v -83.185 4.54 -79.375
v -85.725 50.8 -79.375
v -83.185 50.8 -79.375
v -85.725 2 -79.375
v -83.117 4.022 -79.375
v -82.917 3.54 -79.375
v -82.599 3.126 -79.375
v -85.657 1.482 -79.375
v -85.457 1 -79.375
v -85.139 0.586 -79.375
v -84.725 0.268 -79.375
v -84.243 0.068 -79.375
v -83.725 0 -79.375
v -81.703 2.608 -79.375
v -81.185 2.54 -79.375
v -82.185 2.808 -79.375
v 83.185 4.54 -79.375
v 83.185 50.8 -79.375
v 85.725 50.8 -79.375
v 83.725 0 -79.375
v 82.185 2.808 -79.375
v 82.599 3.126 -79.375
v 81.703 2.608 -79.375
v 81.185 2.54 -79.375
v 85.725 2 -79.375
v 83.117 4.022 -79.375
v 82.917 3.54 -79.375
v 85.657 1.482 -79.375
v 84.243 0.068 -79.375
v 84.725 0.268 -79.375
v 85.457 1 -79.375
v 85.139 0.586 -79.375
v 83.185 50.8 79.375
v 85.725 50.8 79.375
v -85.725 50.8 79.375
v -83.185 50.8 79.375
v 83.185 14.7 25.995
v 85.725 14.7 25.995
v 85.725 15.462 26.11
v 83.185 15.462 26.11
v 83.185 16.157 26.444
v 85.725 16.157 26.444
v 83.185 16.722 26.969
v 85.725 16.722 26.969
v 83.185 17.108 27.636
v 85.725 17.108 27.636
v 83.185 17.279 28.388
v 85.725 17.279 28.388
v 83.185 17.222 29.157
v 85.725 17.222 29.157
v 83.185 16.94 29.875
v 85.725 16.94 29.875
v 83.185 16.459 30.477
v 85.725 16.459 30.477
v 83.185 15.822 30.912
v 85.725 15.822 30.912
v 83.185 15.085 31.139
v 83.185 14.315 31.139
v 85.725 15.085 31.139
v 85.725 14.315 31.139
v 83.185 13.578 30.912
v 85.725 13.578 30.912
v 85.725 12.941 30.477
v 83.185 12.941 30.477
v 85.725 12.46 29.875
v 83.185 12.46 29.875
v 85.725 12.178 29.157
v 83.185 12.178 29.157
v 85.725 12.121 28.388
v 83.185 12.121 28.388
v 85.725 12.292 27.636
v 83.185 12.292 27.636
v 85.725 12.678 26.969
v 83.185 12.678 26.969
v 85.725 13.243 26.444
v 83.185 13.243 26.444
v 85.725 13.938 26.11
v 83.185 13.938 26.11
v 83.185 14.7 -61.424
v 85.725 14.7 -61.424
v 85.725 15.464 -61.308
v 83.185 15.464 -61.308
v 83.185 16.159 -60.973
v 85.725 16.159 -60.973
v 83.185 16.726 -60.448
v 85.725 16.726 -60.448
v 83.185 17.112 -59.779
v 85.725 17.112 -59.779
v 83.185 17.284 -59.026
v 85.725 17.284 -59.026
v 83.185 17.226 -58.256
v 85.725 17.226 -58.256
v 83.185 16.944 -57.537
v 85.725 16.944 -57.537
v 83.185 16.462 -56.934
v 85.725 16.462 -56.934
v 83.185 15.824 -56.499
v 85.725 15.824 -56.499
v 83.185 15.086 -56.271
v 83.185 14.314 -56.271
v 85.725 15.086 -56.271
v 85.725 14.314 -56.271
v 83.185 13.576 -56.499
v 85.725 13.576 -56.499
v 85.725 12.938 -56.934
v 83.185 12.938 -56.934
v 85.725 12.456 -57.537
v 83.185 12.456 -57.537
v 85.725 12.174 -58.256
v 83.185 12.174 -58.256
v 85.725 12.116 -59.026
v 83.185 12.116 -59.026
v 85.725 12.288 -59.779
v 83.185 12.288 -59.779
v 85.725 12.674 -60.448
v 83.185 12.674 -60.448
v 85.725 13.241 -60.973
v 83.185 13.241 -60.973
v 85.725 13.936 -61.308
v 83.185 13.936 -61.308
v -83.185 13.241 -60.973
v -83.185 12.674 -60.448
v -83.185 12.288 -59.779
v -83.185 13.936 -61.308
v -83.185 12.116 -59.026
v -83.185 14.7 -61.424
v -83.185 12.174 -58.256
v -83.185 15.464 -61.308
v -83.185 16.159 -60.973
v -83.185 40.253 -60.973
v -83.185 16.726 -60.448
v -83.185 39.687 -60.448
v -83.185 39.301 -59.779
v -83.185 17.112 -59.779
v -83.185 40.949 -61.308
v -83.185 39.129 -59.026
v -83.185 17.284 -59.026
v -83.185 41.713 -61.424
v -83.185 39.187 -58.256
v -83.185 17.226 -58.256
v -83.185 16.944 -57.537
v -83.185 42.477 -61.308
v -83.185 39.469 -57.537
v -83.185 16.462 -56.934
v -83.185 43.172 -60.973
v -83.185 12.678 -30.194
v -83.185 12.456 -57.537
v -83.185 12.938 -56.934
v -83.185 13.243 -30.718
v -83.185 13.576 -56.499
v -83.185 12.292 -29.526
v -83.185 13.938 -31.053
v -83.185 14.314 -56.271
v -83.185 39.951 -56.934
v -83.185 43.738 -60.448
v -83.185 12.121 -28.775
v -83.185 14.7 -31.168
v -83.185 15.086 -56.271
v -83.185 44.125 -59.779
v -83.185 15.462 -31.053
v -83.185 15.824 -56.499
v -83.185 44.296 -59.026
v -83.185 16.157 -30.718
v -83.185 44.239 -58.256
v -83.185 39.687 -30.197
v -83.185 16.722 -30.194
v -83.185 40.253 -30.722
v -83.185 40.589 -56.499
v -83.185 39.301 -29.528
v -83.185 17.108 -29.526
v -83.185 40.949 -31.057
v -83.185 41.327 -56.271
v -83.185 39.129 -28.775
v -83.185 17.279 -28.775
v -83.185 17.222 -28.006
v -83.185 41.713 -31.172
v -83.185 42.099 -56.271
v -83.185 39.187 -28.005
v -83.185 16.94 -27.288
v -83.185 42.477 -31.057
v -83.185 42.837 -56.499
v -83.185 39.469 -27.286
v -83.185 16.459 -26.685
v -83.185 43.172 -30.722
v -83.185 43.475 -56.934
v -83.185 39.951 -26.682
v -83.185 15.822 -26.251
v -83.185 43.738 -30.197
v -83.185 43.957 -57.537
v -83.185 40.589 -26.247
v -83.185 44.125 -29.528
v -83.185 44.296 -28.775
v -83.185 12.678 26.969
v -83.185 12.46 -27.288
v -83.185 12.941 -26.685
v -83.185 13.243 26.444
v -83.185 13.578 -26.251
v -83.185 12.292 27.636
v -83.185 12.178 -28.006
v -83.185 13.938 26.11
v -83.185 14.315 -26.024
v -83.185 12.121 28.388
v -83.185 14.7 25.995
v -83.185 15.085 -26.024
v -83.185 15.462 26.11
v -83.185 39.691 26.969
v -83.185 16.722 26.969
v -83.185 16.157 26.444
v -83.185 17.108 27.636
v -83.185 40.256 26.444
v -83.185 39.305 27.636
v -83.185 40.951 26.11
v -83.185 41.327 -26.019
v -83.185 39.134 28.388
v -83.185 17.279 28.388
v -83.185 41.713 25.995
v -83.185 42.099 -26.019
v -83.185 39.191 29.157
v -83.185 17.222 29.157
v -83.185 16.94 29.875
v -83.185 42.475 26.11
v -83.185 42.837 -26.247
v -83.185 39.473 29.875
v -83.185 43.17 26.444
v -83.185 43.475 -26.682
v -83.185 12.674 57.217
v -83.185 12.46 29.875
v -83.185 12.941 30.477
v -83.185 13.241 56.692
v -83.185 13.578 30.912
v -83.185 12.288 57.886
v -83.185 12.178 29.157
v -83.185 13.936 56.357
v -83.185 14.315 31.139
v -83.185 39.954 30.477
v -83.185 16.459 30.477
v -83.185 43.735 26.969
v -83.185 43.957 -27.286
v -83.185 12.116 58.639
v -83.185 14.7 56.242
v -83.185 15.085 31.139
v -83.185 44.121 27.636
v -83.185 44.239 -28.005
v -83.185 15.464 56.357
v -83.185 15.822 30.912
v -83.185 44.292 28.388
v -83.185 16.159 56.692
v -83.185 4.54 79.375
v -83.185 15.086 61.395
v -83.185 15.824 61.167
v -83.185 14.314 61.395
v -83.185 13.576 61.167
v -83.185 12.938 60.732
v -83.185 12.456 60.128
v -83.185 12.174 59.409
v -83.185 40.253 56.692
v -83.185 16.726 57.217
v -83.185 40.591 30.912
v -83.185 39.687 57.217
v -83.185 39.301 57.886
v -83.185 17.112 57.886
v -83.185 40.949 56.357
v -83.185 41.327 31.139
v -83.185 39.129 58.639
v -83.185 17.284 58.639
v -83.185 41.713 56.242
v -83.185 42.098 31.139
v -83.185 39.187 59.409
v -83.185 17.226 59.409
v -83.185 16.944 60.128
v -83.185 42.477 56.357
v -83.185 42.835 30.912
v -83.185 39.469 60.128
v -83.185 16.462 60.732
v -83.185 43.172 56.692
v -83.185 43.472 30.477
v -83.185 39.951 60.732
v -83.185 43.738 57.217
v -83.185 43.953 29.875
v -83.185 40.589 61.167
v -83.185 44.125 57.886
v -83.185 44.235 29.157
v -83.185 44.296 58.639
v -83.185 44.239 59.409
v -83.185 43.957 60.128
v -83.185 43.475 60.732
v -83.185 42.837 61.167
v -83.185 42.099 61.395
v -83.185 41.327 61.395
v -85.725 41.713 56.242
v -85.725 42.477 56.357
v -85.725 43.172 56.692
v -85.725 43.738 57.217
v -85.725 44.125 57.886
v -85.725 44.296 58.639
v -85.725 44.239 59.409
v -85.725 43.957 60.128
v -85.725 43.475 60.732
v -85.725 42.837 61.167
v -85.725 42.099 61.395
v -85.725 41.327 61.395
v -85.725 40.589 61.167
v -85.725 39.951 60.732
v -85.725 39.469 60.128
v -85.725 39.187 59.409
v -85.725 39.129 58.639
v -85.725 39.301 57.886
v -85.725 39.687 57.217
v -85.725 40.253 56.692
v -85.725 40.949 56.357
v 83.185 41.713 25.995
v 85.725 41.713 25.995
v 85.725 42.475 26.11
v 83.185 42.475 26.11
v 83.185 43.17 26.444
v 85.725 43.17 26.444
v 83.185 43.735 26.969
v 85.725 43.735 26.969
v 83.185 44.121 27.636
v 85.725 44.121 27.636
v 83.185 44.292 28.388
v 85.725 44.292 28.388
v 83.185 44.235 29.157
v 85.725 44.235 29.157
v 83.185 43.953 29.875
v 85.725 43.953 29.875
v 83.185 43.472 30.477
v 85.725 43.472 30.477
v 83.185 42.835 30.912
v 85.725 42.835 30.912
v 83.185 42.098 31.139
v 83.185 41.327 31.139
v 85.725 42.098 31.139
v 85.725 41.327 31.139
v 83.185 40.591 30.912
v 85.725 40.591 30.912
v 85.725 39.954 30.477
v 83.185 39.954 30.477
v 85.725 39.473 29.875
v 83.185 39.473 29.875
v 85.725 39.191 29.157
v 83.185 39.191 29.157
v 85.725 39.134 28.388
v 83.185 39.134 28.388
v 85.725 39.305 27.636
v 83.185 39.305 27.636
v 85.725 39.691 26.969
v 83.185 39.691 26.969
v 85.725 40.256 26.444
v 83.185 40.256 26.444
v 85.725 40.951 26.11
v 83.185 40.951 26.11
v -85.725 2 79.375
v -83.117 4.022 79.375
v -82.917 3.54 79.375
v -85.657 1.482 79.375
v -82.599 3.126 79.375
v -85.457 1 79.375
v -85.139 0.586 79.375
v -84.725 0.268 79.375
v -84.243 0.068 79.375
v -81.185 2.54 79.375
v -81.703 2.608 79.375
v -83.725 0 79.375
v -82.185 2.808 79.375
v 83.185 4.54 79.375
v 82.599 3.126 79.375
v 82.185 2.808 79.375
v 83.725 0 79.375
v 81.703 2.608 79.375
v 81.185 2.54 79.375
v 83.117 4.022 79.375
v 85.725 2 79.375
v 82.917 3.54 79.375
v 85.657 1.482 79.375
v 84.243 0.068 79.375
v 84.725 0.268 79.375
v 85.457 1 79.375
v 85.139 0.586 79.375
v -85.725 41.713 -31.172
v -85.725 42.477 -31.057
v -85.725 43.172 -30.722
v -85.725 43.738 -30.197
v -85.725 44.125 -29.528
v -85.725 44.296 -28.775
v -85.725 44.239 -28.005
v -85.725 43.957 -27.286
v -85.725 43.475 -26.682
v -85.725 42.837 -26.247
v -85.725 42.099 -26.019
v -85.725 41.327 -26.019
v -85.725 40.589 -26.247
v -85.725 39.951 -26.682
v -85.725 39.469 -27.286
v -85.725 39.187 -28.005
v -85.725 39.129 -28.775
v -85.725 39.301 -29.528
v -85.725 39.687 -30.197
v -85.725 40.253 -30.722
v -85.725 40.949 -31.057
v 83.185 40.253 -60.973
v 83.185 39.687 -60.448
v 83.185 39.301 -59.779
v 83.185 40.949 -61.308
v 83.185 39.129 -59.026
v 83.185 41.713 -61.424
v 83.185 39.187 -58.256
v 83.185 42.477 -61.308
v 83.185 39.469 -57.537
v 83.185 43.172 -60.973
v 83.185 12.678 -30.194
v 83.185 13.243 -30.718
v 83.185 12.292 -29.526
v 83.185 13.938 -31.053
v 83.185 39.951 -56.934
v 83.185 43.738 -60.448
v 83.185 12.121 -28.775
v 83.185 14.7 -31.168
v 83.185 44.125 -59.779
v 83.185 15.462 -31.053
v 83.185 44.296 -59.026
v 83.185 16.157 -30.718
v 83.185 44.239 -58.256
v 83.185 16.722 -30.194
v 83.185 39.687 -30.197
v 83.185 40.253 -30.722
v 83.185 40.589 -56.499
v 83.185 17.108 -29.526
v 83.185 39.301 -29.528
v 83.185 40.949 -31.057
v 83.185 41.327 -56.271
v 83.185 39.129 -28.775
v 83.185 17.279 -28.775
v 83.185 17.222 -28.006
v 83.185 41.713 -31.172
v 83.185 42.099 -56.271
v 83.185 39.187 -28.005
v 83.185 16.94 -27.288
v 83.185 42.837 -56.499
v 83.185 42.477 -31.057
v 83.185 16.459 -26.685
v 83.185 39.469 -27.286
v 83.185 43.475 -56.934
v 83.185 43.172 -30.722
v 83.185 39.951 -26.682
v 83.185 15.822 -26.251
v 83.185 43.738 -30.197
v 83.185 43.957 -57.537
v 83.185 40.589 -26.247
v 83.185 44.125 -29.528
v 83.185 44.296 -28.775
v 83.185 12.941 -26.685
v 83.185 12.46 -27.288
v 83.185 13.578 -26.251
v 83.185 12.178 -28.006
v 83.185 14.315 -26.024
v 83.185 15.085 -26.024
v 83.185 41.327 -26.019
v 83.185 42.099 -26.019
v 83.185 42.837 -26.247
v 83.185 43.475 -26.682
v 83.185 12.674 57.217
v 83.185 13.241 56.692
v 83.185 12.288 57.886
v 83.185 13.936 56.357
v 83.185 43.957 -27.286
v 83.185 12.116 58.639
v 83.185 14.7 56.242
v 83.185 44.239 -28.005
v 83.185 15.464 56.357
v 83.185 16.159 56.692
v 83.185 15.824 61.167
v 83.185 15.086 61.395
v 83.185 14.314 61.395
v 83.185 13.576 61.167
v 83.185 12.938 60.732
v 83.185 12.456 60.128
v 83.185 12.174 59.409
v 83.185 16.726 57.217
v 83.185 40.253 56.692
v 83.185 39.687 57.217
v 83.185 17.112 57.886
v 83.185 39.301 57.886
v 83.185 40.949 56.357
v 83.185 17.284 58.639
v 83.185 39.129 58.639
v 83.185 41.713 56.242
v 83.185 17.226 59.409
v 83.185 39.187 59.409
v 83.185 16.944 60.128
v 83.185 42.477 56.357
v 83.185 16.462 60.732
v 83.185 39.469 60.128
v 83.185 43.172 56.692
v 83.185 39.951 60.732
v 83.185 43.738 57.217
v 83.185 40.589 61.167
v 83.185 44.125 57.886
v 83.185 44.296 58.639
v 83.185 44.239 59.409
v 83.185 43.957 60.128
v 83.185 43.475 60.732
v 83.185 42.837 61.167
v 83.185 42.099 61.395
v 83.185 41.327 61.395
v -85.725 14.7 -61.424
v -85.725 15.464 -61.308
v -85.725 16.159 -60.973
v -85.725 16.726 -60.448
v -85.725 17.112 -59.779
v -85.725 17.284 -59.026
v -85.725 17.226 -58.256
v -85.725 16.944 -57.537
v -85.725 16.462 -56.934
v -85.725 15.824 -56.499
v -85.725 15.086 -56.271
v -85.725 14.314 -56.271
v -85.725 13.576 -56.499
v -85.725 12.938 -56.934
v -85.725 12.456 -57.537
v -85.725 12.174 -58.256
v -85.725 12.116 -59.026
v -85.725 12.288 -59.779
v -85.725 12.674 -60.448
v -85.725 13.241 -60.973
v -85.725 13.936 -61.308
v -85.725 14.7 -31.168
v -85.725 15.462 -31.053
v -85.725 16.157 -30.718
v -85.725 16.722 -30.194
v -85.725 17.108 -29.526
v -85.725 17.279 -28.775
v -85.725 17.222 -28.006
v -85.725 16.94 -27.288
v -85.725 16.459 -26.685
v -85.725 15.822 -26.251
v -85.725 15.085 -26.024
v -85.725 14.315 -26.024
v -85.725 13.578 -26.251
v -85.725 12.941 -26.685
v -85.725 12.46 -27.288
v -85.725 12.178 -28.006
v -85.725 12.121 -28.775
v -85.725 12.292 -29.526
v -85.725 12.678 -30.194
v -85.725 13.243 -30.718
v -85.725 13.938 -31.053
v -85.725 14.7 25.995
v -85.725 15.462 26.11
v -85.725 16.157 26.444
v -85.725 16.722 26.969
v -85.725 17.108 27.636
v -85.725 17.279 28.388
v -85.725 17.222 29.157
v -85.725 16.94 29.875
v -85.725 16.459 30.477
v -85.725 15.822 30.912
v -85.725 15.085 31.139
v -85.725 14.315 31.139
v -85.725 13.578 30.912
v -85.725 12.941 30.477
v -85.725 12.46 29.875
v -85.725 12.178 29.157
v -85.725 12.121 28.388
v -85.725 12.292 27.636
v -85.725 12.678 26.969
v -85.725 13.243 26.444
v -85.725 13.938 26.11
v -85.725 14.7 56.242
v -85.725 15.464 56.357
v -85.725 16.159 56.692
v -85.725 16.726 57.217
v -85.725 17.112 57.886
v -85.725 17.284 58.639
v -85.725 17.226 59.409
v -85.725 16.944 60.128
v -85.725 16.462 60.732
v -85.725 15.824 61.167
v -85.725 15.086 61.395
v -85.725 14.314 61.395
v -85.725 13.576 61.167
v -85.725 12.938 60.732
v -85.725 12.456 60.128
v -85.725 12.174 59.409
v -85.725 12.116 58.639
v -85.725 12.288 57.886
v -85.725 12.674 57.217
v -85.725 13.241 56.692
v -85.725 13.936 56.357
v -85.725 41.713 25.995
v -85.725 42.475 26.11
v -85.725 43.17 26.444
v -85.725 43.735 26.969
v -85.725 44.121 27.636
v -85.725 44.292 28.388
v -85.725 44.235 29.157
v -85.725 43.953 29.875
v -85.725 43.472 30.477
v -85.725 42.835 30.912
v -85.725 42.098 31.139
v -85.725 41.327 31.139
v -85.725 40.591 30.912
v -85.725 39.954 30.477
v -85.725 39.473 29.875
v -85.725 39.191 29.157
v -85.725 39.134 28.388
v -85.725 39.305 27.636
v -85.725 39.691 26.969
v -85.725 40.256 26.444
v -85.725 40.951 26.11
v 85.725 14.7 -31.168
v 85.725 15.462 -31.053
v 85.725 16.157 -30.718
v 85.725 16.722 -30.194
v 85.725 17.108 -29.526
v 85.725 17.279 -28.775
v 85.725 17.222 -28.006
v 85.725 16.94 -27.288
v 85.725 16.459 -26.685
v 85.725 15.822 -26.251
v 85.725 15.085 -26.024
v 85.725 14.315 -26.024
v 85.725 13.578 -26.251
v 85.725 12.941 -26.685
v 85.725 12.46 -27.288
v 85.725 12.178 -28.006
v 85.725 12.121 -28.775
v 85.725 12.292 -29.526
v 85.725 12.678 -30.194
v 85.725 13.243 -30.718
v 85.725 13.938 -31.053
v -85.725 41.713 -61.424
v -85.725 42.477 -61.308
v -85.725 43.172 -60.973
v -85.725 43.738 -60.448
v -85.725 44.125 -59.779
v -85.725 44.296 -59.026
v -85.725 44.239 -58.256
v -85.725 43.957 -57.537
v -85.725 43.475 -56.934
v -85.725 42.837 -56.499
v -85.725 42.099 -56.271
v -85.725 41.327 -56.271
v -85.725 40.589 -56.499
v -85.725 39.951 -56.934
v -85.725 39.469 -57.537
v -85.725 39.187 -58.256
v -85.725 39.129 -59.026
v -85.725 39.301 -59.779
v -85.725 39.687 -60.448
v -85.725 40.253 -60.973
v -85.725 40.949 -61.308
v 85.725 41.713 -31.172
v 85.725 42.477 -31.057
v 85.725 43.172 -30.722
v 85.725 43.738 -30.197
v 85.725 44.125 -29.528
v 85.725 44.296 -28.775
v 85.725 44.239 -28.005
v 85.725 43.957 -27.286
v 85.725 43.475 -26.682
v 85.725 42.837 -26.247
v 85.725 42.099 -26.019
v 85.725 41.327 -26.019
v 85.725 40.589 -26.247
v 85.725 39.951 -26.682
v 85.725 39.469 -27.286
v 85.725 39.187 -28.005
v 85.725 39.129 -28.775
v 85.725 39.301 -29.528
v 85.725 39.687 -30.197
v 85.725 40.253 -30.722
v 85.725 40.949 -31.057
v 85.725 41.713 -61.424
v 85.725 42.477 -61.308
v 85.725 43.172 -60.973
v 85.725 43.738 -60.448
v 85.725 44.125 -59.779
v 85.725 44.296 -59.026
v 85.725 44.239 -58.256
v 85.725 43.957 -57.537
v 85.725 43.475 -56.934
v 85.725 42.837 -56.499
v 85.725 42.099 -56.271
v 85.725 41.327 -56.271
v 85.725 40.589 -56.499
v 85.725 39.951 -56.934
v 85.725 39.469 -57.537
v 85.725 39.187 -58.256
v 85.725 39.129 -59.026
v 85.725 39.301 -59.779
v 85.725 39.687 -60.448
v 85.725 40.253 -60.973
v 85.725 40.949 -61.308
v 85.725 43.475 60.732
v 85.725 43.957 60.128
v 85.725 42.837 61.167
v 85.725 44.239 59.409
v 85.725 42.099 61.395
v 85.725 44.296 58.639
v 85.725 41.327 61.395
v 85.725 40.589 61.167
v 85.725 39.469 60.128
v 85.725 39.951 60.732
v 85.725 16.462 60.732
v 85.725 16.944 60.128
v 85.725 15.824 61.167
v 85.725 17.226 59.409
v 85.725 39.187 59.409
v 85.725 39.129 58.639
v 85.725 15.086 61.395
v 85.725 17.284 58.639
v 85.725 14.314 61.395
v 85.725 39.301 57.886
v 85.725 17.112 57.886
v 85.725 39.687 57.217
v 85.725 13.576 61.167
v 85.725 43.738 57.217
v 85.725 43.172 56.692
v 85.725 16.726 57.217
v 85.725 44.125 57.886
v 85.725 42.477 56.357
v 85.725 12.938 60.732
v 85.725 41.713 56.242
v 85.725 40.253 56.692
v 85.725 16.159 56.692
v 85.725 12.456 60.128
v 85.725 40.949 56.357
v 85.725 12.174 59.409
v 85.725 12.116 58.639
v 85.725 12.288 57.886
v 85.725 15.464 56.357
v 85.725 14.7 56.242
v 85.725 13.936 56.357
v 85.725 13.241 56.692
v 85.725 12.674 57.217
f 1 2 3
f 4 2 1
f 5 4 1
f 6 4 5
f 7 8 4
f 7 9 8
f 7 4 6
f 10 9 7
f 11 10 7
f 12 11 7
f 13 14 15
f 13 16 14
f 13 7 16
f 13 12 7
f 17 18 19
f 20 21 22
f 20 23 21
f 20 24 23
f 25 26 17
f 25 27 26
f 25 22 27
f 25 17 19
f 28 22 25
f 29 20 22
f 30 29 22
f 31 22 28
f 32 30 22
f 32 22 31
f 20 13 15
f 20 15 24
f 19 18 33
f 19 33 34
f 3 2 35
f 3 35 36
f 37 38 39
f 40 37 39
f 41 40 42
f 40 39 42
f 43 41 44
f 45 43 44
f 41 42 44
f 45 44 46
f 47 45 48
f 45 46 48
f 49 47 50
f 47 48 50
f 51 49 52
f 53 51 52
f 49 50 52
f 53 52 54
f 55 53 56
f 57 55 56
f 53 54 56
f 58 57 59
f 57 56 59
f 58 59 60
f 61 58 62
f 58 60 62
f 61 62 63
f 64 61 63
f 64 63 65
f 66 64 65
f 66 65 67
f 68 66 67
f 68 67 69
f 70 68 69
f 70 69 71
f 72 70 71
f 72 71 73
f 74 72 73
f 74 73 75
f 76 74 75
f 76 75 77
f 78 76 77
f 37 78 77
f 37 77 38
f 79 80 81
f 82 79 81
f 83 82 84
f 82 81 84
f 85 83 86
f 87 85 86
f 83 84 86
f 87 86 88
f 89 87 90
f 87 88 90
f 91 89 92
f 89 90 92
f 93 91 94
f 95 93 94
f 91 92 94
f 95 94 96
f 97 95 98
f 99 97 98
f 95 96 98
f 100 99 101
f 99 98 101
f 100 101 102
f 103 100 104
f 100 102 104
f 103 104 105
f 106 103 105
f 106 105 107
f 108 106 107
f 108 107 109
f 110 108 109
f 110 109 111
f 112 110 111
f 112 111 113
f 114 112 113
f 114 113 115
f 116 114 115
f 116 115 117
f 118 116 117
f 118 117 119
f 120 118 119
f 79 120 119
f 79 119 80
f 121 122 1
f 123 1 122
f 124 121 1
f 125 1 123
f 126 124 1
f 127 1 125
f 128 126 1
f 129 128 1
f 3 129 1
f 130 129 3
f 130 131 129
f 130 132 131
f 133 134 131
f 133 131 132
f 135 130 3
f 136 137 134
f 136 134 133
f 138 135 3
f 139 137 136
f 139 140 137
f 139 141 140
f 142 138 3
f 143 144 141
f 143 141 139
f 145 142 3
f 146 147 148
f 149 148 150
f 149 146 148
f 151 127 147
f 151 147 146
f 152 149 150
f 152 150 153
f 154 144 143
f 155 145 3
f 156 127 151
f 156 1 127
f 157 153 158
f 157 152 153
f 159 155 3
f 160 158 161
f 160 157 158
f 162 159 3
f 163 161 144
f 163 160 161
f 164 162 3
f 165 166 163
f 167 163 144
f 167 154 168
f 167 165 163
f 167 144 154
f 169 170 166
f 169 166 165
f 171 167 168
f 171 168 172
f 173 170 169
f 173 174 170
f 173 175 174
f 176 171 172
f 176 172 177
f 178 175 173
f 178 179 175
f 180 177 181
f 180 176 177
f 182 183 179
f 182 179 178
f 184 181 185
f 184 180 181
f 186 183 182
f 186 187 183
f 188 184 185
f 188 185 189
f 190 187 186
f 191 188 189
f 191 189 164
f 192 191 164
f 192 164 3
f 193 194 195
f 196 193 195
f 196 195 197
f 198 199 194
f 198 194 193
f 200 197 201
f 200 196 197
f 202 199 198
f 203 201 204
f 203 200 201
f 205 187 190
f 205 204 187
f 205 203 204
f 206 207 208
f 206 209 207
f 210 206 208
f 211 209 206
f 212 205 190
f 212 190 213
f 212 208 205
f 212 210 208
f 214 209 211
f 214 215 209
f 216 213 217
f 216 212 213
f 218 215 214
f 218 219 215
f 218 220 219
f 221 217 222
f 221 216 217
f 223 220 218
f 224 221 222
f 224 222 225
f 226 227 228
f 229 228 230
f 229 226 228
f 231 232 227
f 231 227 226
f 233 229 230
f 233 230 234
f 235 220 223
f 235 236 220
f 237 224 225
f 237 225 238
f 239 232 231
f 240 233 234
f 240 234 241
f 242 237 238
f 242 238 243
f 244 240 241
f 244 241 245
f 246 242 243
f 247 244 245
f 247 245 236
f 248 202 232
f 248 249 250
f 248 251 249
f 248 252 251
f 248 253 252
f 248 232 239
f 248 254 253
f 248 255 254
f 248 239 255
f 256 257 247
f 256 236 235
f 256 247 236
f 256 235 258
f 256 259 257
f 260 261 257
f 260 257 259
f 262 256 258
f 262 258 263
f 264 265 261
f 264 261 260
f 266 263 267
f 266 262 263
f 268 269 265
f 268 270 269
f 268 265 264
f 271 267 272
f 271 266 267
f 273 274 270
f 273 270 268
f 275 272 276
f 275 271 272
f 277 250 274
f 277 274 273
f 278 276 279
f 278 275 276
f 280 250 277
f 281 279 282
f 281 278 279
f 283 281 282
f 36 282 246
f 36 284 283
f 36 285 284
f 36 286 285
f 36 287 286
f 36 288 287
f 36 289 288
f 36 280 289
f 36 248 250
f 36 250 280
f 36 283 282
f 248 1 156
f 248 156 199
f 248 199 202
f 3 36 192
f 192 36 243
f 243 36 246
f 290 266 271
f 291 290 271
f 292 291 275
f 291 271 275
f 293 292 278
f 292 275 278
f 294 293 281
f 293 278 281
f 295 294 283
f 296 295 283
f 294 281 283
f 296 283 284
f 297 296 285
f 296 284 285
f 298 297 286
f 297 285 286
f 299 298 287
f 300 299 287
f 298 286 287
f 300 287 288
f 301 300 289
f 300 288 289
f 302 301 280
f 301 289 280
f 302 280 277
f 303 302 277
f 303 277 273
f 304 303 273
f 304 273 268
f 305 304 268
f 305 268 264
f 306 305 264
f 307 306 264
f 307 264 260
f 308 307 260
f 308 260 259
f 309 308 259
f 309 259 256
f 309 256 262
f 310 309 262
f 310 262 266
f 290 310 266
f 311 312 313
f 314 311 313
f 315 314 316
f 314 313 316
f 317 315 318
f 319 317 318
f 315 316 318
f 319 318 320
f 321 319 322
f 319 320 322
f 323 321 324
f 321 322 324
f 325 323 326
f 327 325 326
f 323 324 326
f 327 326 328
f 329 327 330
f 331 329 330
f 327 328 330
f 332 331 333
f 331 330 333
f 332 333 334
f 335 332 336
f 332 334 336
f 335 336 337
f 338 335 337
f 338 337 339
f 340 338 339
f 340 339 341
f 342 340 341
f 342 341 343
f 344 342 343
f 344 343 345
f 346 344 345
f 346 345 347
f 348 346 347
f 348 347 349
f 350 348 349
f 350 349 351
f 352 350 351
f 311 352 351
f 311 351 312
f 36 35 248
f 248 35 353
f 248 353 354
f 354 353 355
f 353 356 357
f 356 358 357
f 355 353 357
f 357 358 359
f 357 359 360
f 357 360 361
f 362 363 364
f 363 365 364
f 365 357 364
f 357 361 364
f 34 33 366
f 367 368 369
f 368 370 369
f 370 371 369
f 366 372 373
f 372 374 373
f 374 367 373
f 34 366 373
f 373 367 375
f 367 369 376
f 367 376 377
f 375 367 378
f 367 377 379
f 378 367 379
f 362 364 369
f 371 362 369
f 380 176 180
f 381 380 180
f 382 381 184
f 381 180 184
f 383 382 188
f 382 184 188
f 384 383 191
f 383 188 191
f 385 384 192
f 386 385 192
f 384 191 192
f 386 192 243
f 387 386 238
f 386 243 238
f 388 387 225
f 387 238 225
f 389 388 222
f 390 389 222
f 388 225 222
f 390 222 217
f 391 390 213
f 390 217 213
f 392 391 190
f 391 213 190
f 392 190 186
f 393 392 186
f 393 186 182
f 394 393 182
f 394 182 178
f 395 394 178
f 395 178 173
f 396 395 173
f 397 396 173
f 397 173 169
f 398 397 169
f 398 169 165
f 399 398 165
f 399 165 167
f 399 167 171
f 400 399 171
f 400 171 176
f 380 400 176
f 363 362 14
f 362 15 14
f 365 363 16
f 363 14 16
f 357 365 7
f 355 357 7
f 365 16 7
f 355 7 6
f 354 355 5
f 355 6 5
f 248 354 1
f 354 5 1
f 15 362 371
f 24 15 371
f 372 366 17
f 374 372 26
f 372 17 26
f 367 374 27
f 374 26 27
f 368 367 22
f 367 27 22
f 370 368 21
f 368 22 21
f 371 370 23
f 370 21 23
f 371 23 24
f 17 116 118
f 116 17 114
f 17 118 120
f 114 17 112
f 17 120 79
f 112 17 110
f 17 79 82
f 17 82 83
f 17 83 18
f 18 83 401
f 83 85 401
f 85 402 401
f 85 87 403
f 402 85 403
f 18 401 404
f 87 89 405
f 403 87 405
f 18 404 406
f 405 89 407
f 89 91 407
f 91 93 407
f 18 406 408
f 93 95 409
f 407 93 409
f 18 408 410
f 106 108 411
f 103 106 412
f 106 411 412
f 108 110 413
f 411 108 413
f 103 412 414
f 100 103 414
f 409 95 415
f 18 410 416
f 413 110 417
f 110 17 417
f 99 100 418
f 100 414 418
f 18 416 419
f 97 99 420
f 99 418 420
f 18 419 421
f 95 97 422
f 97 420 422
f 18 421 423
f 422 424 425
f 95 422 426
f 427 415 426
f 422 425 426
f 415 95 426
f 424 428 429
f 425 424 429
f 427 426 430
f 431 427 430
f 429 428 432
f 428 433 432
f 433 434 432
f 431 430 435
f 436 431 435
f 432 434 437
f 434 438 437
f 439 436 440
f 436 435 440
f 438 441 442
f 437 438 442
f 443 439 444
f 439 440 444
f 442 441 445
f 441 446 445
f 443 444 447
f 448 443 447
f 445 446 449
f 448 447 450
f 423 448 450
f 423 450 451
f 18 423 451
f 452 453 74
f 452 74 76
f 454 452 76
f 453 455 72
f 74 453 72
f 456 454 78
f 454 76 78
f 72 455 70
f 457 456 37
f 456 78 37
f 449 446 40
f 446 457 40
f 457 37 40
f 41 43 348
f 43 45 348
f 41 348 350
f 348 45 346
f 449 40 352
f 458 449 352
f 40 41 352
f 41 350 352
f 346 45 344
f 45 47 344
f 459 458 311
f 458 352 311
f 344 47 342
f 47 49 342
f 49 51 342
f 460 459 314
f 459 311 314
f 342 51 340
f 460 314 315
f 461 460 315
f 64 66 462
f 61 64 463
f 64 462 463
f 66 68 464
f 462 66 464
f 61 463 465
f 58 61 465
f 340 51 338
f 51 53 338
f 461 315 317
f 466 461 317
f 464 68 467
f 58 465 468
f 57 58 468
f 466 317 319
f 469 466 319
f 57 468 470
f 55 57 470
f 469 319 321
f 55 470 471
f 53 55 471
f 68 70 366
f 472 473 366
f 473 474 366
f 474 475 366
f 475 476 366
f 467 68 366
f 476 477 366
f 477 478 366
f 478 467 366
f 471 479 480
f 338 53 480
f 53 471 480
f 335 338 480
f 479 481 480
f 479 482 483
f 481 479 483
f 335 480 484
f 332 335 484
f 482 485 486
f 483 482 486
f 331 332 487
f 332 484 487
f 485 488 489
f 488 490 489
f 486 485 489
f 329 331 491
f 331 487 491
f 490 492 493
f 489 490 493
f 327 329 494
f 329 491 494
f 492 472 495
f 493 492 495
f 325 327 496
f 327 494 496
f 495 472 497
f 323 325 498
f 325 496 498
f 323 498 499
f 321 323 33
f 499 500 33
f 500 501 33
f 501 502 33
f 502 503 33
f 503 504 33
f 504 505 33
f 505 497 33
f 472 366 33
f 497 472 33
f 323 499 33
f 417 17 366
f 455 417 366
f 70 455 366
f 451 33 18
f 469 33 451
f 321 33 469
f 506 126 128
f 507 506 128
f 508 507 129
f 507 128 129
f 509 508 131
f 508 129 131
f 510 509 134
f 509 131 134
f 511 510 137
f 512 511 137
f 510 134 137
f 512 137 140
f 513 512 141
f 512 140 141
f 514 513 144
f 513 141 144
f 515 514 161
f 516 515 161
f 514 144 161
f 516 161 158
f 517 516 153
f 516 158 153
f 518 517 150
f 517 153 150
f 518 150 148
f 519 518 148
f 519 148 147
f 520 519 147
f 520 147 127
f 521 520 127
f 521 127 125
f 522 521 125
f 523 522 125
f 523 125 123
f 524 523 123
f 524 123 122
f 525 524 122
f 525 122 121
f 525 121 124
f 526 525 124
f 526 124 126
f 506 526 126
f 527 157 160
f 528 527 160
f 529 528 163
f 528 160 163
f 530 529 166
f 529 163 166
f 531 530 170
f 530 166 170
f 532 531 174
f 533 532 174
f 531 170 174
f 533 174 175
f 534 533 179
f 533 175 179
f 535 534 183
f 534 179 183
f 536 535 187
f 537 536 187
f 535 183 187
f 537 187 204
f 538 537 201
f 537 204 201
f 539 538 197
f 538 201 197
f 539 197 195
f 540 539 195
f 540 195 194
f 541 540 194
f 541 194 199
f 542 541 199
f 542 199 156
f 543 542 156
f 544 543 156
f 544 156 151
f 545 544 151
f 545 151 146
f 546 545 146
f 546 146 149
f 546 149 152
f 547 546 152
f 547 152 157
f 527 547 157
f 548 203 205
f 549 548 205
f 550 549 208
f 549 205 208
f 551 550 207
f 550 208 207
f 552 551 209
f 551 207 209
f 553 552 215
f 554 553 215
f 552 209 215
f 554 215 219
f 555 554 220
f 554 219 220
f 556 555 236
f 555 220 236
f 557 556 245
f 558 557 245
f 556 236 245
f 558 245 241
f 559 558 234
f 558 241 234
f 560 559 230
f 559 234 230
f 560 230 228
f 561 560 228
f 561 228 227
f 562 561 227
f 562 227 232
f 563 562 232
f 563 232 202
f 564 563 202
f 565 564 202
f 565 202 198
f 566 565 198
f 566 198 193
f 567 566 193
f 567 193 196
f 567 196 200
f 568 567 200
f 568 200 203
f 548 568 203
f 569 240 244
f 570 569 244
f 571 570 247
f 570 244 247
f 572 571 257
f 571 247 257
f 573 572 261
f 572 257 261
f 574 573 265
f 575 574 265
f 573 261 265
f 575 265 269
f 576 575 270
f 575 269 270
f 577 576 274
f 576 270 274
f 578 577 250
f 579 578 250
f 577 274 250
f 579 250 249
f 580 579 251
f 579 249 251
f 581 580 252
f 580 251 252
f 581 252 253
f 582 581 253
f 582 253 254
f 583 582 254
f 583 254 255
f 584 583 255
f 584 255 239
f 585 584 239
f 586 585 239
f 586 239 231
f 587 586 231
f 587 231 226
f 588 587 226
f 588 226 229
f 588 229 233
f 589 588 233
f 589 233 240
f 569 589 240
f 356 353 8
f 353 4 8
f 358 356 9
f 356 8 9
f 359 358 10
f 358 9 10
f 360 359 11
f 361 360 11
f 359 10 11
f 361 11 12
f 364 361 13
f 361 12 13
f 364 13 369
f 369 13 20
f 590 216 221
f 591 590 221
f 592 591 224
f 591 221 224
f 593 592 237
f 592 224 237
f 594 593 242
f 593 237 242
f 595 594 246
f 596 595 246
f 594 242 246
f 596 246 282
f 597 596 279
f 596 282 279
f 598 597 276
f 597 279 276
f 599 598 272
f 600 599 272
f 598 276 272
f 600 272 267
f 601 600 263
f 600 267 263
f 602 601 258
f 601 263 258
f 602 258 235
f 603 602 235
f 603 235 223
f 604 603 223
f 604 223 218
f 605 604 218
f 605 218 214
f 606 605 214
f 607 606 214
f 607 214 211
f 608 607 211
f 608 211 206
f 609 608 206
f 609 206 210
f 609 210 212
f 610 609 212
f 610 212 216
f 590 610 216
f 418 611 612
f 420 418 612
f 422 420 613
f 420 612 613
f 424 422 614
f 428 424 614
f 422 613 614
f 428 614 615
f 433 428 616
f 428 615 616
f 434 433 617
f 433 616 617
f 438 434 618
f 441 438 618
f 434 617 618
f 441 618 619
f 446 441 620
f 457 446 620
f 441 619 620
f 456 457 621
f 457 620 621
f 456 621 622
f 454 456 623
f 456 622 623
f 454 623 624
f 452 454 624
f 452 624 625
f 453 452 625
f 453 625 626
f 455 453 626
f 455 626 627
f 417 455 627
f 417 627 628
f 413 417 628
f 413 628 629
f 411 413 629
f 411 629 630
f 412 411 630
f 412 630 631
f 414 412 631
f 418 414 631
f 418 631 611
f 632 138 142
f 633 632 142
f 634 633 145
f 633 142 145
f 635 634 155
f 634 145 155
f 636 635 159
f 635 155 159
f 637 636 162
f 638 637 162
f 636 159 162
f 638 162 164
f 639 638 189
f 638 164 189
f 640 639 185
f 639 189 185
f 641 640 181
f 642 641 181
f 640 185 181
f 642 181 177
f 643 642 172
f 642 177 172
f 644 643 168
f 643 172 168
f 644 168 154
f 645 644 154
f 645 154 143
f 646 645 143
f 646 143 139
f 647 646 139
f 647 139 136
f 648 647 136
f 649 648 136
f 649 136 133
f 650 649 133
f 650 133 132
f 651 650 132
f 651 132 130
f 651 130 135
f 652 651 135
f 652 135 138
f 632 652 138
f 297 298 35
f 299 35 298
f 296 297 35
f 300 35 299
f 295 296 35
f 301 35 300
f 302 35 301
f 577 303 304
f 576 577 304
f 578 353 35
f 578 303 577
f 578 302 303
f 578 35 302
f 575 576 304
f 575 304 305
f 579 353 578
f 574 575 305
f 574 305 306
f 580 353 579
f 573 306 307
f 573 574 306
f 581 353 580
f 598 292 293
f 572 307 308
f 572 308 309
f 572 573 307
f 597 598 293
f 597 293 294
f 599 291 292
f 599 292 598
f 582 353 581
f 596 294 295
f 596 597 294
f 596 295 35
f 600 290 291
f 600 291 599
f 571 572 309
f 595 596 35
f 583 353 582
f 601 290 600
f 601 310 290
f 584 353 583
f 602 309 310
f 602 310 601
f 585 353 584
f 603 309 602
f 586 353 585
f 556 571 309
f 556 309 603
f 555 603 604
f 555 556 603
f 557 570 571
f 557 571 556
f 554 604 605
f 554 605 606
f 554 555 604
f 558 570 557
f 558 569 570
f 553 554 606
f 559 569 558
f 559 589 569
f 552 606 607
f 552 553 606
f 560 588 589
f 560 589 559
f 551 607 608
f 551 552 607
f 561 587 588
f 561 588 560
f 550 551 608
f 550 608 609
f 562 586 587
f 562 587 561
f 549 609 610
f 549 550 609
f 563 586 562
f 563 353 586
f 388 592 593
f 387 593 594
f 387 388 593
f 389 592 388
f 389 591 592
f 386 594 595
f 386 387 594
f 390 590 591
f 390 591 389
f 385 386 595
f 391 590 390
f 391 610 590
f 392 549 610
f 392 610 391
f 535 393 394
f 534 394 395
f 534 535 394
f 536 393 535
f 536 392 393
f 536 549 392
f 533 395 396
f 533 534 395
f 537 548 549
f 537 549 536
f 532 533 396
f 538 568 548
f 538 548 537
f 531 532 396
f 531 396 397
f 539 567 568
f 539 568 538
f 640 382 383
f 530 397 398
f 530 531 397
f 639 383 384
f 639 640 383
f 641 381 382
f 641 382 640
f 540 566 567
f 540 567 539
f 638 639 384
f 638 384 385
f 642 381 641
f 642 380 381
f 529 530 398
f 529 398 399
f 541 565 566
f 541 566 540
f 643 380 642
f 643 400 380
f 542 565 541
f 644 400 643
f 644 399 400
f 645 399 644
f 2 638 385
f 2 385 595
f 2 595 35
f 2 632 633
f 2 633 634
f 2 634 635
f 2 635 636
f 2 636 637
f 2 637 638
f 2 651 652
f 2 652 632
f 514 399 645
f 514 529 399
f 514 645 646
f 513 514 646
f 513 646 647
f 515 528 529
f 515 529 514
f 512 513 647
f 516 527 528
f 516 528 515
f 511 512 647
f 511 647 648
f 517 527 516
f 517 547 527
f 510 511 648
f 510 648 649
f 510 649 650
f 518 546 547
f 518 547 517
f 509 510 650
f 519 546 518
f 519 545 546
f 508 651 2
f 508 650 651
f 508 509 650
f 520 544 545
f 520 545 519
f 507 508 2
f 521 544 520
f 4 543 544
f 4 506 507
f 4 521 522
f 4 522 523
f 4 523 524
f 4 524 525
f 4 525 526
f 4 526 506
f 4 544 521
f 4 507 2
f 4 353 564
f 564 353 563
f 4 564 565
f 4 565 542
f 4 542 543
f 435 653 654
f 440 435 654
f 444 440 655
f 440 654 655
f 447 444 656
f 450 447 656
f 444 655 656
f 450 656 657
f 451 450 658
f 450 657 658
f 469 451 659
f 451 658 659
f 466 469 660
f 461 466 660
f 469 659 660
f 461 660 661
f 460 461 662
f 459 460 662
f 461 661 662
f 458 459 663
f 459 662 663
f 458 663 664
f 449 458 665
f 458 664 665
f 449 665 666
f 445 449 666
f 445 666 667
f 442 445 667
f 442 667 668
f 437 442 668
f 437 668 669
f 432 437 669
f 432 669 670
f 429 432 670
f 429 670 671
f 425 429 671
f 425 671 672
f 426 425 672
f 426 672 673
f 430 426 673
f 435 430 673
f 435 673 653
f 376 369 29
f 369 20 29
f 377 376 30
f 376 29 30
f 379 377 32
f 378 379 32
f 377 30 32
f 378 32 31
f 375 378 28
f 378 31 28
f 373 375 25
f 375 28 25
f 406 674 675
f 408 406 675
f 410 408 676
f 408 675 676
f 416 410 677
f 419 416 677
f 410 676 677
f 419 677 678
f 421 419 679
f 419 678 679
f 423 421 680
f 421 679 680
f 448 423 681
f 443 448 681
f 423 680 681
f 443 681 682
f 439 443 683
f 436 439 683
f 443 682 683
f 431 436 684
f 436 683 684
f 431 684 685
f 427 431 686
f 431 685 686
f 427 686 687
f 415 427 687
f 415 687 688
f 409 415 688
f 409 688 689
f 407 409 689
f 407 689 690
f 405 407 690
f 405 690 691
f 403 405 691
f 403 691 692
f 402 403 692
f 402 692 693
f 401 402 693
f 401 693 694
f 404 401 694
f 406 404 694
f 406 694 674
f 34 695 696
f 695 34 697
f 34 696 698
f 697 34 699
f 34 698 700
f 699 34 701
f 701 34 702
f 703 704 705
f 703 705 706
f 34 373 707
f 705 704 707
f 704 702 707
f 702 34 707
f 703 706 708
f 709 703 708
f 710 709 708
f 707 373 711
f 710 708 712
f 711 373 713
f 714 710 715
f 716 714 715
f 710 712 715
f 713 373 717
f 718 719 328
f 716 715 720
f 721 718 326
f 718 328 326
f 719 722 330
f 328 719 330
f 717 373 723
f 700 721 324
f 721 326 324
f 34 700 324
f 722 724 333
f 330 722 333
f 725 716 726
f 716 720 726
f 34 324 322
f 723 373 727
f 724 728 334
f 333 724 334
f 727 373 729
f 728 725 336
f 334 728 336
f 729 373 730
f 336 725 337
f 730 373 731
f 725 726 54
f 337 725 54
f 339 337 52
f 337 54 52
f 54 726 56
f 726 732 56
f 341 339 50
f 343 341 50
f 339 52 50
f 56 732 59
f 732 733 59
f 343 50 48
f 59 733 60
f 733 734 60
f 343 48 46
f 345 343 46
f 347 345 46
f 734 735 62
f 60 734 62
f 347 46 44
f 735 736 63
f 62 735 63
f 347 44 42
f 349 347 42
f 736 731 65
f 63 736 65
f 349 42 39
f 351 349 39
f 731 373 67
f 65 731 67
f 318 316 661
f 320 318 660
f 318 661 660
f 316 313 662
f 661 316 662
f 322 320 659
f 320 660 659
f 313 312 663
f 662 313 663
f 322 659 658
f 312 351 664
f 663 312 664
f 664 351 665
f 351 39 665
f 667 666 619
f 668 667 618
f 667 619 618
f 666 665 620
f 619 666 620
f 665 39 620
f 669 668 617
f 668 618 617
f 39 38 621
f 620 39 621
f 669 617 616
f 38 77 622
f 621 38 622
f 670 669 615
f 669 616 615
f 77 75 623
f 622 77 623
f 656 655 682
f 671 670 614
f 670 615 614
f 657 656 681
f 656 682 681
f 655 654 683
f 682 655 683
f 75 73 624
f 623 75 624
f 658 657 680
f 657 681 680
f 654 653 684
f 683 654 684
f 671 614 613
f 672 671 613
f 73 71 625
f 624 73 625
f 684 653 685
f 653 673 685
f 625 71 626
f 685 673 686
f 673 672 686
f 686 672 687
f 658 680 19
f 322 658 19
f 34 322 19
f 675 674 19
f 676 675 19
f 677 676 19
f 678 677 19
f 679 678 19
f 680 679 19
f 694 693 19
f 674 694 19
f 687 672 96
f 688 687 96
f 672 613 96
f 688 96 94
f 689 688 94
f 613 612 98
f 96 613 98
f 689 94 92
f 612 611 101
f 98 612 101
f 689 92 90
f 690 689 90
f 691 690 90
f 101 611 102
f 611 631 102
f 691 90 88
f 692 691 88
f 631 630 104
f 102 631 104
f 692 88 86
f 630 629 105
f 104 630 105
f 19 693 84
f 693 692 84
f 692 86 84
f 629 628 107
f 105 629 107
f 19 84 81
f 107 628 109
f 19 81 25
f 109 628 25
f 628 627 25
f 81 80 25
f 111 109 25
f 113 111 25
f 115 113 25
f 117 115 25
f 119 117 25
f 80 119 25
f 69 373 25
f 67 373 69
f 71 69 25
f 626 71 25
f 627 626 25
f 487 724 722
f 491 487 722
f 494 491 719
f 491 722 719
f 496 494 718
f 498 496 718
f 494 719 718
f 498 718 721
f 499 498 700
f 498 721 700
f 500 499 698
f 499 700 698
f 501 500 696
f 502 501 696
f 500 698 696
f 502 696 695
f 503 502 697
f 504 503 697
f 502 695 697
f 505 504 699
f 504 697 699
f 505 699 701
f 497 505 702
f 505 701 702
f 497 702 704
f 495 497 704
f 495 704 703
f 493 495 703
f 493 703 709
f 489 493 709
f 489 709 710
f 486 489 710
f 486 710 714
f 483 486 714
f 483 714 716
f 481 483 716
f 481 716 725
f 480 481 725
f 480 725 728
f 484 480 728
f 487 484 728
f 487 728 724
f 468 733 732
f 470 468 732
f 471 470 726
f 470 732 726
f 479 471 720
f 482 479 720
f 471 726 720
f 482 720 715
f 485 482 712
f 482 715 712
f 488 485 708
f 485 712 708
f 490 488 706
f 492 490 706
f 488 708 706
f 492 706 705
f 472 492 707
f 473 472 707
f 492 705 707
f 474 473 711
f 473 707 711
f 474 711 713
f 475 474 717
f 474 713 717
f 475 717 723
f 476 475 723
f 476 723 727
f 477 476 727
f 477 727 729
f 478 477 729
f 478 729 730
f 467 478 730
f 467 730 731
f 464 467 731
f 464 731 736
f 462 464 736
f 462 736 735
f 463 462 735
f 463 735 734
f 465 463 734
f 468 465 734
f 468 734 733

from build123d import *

# Parameters (mm, degrees)
SKETCH2_W           = 171.45
SKETCH2_H           = 158.75
BOSS_EXTRUDE1_DEPTH = 50.8
SKETCH3_W           = 166.37
SKETCH3_H           = 48.26
CUT_EXTRUDE1_DEPTH  = 188.432596218
FILLET1_R           = 2
SKETCH5_R           = 2.5908
SKETCH5_R_2         = 2.5865
CUT_EXTRUDE2_DEPTH  = 196.642871388


with BuildPart() as part:
    # Sketch2 → Boss-Extrude1 (new body)
    with BuildSketch(Plane(origin=(0, 0, 0), x_dir=(1, 0, 0), z_dir=(0, 1, 0))):
        Rectangle(SKETCH2_W, SKETCH2_H)
    extrude(amount=BOSS_EXTRUDE1_DEPTH)

    # Sketch3 → Cut-Extrude1 (cut, through all)
    with BuildSketch(Plane.XY.offset(79.375)):
        with Locations((0, 26.67)):
            Rectangle(SKETCH3_W, SKETCH3_H)
    extrude(amount=-CUT_EXTRUDE1_DEPTH, mode=Mode.SUBTRACT)

    # Fillet1
    fillet1_edges = [part.edges().sort_by_distance(p)[0] for p in [
        (-83.185, 2.54, 0),
        (83.185, 2.54, 0),
        (85.725, 0, 0),
        (-85.725, 0, 0),
    ]]
    fillet(fillet1_edges, radius=FILLET1_R)

    # Sketch5 → Cut-Extrude2 (cut, through all)
    with BuildSketch(Plane(origin=(85.725, 0, 0), x_dir=(0, 0, -1), z_dir=(1, 0, 0))):
        with Locations((-58.83275, 41.7129)):
            Circle(SKETCH5_R)
        with Locations((-58.83275, 14.7)):
            Circle(SKETCH5_R)
        with Locations((58.83275, 41.7129)):
            Circle(SKETCH5_R)
        with Locations((58.83275, 14.7)):
            Circle(SKETCH5_R)
        with Locations((-28.58135, 41.7129)):
            Circle(SKETCH5_R_2)
        with Locations((-28.58135, 14.7)):
            Circle(SKETCH5_R_2)
        with Locations((28.58135, 41.7129)):
            Circle(SKETCH5_R)
        with Locations((28.58135, 14.7)):
            Circle(SKETCH5_R_2)
    extrude(amount=-CUT_EXTRUDE2_DEPTH, mode=Mode.SUBTRACT)


solid = part.part
